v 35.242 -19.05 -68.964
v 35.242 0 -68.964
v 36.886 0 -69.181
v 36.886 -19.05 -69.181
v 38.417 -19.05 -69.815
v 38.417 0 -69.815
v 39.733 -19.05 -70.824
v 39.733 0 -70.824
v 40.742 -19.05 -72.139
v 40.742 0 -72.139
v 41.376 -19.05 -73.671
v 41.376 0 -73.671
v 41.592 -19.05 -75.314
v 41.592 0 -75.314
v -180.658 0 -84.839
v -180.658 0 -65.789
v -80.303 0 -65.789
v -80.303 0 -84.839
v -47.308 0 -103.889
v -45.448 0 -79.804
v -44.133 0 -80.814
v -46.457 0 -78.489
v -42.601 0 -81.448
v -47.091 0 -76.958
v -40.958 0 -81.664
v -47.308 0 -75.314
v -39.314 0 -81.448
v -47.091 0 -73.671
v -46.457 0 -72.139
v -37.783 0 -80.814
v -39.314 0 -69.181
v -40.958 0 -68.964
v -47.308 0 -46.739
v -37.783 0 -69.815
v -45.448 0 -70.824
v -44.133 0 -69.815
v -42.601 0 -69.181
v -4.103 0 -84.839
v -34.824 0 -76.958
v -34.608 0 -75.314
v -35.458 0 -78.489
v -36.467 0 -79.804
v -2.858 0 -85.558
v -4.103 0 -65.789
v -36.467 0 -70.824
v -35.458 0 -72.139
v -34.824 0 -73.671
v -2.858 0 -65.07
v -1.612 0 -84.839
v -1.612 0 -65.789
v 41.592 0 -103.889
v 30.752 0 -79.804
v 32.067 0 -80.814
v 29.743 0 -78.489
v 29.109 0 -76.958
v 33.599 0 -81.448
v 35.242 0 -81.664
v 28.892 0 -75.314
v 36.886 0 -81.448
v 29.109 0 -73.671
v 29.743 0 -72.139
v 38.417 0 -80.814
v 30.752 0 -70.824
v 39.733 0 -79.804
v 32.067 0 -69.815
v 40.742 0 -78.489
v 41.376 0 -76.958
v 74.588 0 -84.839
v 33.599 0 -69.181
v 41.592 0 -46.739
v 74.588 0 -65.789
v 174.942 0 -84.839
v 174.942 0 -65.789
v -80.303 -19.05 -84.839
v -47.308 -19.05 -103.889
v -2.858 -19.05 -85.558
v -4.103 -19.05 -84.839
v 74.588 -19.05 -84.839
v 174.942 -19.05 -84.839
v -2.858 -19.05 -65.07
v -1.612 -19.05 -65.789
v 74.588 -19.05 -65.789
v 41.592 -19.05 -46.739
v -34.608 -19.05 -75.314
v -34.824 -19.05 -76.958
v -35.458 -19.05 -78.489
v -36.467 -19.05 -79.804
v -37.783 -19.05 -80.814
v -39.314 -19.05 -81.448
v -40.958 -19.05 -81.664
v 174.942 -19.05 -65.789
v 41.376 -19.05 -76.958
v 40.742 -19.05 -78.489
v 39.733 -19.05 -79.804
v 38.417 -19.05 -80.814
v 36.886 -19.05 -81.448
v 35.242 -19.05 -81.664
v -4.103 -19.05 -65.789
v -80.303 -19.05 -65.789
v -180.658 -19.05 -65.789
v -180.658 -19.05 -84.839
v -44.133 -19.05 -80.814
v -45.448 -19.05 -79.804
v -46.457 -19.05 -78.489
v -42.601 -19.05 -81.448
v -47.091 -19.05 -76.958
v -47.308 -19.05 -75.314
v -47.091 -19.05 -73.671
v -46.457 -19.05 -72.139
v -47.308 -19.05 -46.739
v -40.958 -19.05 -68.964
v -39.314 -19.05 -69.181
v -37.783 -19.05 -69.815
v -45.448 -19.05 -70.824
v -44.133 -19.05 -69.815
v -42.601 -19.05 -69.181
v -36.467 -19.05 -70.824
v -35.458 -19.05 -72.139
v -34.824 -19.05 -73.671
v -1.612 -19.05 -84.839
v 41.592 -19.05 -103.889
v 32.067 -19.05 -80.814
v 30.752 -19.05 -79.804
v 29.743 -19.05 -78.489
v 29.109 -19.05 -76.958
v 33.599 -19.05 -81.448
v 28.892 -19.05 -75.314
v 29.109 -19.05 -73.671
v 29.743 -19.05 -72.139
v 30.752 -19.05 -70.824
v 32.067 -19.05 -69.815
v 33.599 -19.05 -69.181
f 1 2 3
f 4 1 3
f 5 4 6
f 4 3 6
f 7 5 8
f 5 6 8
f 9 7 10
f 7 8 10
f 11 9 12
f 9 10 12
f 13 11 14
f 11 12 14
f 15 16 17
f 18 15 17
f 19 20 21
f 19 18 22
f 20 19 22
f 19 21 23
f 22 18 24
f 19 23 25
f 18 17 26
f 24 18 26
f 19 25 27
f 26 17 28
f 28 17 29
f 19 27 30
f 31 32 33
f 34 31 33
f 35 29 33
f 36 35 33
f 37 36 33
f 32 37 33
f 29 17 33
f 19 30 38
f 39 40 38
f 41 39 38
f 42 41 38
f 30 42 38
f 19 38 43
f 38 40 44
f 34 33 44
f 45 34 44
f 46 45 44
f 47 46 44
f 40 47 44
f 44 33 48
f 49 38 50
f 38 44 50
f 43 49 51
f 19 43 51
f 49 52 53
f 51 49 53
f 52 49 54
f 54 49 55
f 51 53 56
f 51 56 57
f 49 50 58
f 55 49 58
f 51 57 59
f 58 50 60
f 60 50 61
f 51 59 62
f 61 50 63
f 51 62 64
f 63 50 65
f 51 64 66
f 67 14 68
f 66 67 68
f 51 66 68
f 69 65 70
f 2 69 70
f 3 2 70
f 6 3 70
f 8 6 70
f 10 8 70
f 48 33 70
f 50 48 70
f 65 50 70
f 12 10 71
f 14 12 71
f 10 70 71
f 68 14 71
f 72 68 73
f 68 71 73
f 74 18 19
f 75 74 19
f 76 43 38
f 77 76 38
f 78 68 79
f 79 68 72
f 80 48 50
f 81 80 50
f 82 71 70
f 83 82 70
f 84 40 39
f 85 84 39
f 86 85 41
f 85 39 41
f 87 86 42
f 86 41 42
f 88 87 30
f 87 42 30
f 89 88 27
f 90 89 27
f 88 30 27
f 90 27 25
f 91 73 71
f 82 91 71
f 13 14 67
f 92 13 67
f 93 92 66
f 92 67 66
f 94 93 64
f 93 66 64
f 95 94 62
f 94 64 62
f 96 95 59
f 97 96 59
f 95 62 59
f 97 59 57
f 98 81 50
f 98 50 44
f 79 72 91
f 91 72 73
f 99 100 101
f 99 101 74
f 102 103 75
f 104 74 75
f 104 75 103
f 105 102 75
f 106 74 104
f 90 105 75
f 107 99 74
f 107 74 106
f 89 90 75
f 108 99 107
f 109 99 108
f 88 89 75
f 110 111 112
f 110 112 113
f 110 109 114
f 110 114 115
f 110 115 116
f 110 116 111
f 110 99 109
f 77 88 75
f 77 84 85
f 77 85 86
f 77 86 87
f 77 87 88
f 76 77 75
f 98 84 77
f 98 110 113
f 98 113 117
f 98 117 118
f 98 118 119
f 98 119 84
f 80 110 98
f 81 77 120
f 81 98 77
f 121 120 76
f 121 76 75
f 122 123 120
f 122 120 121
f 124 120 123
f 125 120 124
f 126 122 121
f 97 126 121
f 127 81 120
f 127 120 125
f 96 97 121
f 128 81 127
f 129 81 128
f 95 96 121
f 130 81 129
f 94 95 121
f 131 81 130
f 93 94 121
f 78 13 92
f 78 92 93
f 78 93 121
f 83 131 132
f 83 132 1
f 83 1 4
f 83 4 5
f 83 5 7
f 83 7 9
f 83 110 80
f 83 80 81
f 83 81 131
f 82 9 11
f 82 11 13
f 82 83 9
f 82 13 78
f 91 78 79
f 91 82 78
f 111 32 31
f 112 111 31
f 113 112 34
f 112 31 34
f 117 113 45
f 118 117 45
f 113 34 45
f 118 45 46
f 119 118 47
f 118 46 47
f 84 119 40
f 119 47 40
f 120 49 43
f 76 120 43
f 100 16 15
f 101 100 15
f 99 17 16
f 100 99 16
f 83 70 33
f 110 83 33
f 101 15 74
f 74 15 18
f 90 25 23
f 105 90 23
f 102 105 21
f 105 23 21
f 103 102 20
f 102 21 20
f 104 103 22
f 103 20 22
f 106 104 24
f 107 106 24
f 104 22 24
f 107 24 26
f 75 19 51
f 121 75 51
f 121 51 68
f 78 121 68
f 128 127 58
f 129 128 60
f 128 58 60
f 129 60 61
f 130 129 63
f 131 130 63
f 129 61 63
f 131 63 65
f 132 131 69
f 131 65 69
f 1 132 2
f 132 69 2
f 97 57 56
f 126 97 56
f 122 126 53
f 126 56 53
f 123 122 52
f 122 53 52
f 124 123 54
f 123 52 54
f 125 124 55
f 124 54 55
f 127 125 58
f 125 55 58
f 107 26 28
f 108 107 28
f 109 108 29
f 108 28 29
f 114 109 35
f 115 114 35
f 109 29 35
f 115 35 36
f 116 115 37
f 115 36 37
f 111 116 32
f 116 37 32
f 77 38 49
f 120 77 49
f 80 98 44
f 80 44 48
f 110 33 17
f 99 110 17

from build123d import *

# Parameters (mm, degrees)
F1_DEPTH = 19.05


with BuildPart() as f1:
    # F0 (on Front) → F1 (new body)
    with BuildSketch(Plane.XZ):
        Polygon((-80.3030704341, -65.7893445744), (-180.6575025499, -65.7893445744), (-180.6575025499, -84.8393445744), (-80.3030704341, -84.8393445744), (-47.3075025499, -84.8393445744), (-47.3075025499, -75.3143445744), (-47.3075025499, -65.7893445744), align=None)
        Polygon((-47.3075025499, -46.7393445744), (-80.3030704341, -65.7893445744), (-47.3075025499, -65.7893445744), align=None)
        Polygon((-47.3075025499, -46.7393445744), (-47.3075025499, -65.7893445744), (-40.9575025499, -65.7893445744), (-34.6075025499, -65.7893445744), (-34.6075025499, -46.7393445744), align=None)
        with BuildLine():
            Line((-40.9575025499, -65.7893445744), (-47.3075025499, -65.7893445744))
            Line((-47.3075025499, -65.7893445744), (-47.3075025499, -75.3143445744))
            ThreePointArc((-47.3075025499, -75.3143445744), (-45.4476306104, -70.8242165139), (-40.9575025499, -68.9643445744))
            Line((-40.9575025499, -68.9643445744), (-40.9575025499, -65.7893445744))
        make_face()
        Polygon((-47.3075025499, -84.8393445744), (-80.3030704341, -84.8393445744), (-47.3075025499, -103.8893445744), align=None)
        with BuildLine():
            Line((-34.6075025499, -65.7893445744), (-40.9575025499, -65.7893445744))
            Line((-40.9575025499, -65.7893445744), (-40.9575025499, -68.9643445744))
            ThreePointArc((-40.9575025499, -68.9643445744), (-36.4673744894, -70.8242165139), (-34.6075025499, -75.3143445744))
            Line((-34.6075025499, -75.3143445744), (-34.6075025499, -65.7893445744))
        make_face()
        with BuildLine():
            ThreePointArc((-40.9575025499, -81.6643445744), (-45.4476306104, -79.8044726349), (-47.3075025499, -75.3143445744))
            Line((-47.3075025499, -75.3143445744), (-47.3075025499, -84.8393445744))
            Line((-47.3075025499, -84.8393445744), (-43.3831779935, -84.8393445744))
            Line((-43.3831779935, -84.8393445744), (-40.9575025499, -84.8393445744))
            Line((-40.9575025499, -84.8393445744), (-40.9575025499, -81.6643445744))
        make_face()
        Polygon((-2.8575025499, -65.0702156212), (-34.6075025499, -46.7393445744), (-34.6075025499, -65.7893445744), (-4.1030704341, -65.7893445744), align=None)
        Polygon((28.8924974501, -46.7393445744), (-34.6075025499, -46.7393445744), (-2.8575025499, -65.0702156212), align=None)
        Polygon((-43.3831779935, -84.8393445744), (-47.3075025499, -84.8393445744), (-47.3075025499, -103.8893445744), (-34.6075025499, -103.8893445744), (-34.6075025499, -84.8393445744), (-40.9575025499, -84.8393445744), align=None)
        Polygon((-4.1030704341, -65.7893445744), (-34.6075025499, -65.7893445744), (-34.6075025499, -75.3143445744), (-34.6075025499, -84.8393445744), (-4.1030704341, -84.8393445744), (-2.8575025499, -84.8393445744), (-2.8575025499, -65.7893445744), align=None)
        with BuildLine():
            ThreePointArc((-34.6075025499, -75.3143445744), (-36.4673744894, -79.8044726349), (-40.9575025499, -81.6643445744))
            Line((-40.9575025499, -81.6643445744), (-40.9575025499, -84.8393445744))
            Line((-40.9575025499, -84.8393445744), (-34.6075025499, -84.8393445744))
            Line((-34.6075025499, -84.8393445744), (-34.6075025499, -75.3143445744))
        make_face()
        Polygon((28.8924974501, -46.7393445744), (-2.8575025499, -65.0702156212), (-1.6119346657, -65.7893445744), (28.8924974501, -65.7893445744), align=None)
        Polygon((41.5924974501, -46.7393445744), (28.8924974501, -46.7393445744), (28.8924974501, -65.7893445744), (35.2424974501, -65.7893445744), (41.5924974501, -65.7893445744), align=None)
        Polygon((-34.6075025499, -84.8393445744), (-34.6075025499, -103.8893445744), (-2.8575025499, -85.5584735276), (-4.1030704341, -84.8393445744), align=None)
        Polygon((-2.8575025499, -85.5584735276), (-34.6075025499, -103.8893445744), (28.8924974501, -103.8893445744), align=None)
        Polygon((28.8924974501, -65.7893445744), (-1.6119346657, -65.7893445744), (-2.8575025499, -65.7893445744), (-2.8575025499, -84.8393445744), (-1.6119346657, -84.8393445744), (28.8924974501, -84.8393445744), (28.8924974501, -75.3143445744), align=None)
        Polygon((74.5880653343, -65.7893445744), (41.5924974501, -46.7393445744), (41.5924974501, -65.7893445744), align=None)
        with BuildLine():
            Line((35.2424974501, -65.7893445744), (28.8924974501, -65.7893445744))
            Line((28.8924974501, -65.7893445744), (28.8924974501, -75.3143445744))
            ThreePointArc((28.8924974501, -75.3143445744), (30.7523693896, -70.8242165139), (35.2424974501, -68.9643445744))
            Line((35.2424974501, -68.9643445744), (35.2424974501, -65.7893445744))
        make_face()
        Polygon((-1.6119346657, -84.8393445744), (-2.8575025499, -85.5584735276), (28.8924974501, -103.8893445744), (28.8924974501, -84.8393445744), align=None)
        Polygon((28.8924974501, -84.8393445744), (28.8924974501, -103.8893445744), (41.5924974501, -103.8893445744), (41.5924974501, -84.8393445744), (35.2424974501, -84.8393445744), align=None)
        with BuildLine():
            Line((41.5924974501, -75.3143445744), (41.5924974501, -65.7893445744))
            Line((41.5924974501, -65.7893445744), (35.2424974501, -65.7893445744))
            Line((35.2424974501, -65.7893445744), (35.2424974501, -68.9643445744))
            ThreePointArc((35.2424974501, -68.9643445744), (39.7326255106, -70.8242165139), (41.5924974501, -75.3143445744))
        make_face()
        Polygon((74.5880653343, -65.7893445744), (41.5924974501, -65.7893445744), (41.5924974501, -75.3143445744), (41.5924974501, -84.8393445744), (74.5880653343, -84.8393445744), (174.9424974501, -84.8393445744), (174.9424974501, -65.7893445744), align=None)
        with BuildLine():
            ThreePointArc((35.2424974501, -81.6643445744), (30.7523693896, -79.8044726349), (28.8924974501, -75.3143445744))
            Line((28.8924974501, -75.3143445744), (28.8924974501, -84.8393445744))
            Line((28.8924974501, -84.8393445744), (35.2424974501, -84.8393445744))
            Line((35.2424974501, -84.8393445744), (35.2424974501, -81.6643445744))
        make_face()
        Polygon((41.5924974501, -84.8393445744), (41.5924974501, -103.8893445744), (74.5880653343, -84.8393445744), align=None)
        with BuildLine():
            Line((41.5924974501, -84.8393445744), (41.5924974501, -75.3143445744))
            ThreePointArc((41.5924974501, -75.3143445744), (39.7326255106, -79.8044726349), (35.2424974501, -81.6643445744))
            Line((35.2424974501, -81.6643445744), (35.2424974501, -84.8393445744))
            Line((35.2424974501, -84.8393445744), (41.5924974501, -84.8393445744))
        make_face()
    extrude(amount=F1_DEPTH)


solid = f1.part
